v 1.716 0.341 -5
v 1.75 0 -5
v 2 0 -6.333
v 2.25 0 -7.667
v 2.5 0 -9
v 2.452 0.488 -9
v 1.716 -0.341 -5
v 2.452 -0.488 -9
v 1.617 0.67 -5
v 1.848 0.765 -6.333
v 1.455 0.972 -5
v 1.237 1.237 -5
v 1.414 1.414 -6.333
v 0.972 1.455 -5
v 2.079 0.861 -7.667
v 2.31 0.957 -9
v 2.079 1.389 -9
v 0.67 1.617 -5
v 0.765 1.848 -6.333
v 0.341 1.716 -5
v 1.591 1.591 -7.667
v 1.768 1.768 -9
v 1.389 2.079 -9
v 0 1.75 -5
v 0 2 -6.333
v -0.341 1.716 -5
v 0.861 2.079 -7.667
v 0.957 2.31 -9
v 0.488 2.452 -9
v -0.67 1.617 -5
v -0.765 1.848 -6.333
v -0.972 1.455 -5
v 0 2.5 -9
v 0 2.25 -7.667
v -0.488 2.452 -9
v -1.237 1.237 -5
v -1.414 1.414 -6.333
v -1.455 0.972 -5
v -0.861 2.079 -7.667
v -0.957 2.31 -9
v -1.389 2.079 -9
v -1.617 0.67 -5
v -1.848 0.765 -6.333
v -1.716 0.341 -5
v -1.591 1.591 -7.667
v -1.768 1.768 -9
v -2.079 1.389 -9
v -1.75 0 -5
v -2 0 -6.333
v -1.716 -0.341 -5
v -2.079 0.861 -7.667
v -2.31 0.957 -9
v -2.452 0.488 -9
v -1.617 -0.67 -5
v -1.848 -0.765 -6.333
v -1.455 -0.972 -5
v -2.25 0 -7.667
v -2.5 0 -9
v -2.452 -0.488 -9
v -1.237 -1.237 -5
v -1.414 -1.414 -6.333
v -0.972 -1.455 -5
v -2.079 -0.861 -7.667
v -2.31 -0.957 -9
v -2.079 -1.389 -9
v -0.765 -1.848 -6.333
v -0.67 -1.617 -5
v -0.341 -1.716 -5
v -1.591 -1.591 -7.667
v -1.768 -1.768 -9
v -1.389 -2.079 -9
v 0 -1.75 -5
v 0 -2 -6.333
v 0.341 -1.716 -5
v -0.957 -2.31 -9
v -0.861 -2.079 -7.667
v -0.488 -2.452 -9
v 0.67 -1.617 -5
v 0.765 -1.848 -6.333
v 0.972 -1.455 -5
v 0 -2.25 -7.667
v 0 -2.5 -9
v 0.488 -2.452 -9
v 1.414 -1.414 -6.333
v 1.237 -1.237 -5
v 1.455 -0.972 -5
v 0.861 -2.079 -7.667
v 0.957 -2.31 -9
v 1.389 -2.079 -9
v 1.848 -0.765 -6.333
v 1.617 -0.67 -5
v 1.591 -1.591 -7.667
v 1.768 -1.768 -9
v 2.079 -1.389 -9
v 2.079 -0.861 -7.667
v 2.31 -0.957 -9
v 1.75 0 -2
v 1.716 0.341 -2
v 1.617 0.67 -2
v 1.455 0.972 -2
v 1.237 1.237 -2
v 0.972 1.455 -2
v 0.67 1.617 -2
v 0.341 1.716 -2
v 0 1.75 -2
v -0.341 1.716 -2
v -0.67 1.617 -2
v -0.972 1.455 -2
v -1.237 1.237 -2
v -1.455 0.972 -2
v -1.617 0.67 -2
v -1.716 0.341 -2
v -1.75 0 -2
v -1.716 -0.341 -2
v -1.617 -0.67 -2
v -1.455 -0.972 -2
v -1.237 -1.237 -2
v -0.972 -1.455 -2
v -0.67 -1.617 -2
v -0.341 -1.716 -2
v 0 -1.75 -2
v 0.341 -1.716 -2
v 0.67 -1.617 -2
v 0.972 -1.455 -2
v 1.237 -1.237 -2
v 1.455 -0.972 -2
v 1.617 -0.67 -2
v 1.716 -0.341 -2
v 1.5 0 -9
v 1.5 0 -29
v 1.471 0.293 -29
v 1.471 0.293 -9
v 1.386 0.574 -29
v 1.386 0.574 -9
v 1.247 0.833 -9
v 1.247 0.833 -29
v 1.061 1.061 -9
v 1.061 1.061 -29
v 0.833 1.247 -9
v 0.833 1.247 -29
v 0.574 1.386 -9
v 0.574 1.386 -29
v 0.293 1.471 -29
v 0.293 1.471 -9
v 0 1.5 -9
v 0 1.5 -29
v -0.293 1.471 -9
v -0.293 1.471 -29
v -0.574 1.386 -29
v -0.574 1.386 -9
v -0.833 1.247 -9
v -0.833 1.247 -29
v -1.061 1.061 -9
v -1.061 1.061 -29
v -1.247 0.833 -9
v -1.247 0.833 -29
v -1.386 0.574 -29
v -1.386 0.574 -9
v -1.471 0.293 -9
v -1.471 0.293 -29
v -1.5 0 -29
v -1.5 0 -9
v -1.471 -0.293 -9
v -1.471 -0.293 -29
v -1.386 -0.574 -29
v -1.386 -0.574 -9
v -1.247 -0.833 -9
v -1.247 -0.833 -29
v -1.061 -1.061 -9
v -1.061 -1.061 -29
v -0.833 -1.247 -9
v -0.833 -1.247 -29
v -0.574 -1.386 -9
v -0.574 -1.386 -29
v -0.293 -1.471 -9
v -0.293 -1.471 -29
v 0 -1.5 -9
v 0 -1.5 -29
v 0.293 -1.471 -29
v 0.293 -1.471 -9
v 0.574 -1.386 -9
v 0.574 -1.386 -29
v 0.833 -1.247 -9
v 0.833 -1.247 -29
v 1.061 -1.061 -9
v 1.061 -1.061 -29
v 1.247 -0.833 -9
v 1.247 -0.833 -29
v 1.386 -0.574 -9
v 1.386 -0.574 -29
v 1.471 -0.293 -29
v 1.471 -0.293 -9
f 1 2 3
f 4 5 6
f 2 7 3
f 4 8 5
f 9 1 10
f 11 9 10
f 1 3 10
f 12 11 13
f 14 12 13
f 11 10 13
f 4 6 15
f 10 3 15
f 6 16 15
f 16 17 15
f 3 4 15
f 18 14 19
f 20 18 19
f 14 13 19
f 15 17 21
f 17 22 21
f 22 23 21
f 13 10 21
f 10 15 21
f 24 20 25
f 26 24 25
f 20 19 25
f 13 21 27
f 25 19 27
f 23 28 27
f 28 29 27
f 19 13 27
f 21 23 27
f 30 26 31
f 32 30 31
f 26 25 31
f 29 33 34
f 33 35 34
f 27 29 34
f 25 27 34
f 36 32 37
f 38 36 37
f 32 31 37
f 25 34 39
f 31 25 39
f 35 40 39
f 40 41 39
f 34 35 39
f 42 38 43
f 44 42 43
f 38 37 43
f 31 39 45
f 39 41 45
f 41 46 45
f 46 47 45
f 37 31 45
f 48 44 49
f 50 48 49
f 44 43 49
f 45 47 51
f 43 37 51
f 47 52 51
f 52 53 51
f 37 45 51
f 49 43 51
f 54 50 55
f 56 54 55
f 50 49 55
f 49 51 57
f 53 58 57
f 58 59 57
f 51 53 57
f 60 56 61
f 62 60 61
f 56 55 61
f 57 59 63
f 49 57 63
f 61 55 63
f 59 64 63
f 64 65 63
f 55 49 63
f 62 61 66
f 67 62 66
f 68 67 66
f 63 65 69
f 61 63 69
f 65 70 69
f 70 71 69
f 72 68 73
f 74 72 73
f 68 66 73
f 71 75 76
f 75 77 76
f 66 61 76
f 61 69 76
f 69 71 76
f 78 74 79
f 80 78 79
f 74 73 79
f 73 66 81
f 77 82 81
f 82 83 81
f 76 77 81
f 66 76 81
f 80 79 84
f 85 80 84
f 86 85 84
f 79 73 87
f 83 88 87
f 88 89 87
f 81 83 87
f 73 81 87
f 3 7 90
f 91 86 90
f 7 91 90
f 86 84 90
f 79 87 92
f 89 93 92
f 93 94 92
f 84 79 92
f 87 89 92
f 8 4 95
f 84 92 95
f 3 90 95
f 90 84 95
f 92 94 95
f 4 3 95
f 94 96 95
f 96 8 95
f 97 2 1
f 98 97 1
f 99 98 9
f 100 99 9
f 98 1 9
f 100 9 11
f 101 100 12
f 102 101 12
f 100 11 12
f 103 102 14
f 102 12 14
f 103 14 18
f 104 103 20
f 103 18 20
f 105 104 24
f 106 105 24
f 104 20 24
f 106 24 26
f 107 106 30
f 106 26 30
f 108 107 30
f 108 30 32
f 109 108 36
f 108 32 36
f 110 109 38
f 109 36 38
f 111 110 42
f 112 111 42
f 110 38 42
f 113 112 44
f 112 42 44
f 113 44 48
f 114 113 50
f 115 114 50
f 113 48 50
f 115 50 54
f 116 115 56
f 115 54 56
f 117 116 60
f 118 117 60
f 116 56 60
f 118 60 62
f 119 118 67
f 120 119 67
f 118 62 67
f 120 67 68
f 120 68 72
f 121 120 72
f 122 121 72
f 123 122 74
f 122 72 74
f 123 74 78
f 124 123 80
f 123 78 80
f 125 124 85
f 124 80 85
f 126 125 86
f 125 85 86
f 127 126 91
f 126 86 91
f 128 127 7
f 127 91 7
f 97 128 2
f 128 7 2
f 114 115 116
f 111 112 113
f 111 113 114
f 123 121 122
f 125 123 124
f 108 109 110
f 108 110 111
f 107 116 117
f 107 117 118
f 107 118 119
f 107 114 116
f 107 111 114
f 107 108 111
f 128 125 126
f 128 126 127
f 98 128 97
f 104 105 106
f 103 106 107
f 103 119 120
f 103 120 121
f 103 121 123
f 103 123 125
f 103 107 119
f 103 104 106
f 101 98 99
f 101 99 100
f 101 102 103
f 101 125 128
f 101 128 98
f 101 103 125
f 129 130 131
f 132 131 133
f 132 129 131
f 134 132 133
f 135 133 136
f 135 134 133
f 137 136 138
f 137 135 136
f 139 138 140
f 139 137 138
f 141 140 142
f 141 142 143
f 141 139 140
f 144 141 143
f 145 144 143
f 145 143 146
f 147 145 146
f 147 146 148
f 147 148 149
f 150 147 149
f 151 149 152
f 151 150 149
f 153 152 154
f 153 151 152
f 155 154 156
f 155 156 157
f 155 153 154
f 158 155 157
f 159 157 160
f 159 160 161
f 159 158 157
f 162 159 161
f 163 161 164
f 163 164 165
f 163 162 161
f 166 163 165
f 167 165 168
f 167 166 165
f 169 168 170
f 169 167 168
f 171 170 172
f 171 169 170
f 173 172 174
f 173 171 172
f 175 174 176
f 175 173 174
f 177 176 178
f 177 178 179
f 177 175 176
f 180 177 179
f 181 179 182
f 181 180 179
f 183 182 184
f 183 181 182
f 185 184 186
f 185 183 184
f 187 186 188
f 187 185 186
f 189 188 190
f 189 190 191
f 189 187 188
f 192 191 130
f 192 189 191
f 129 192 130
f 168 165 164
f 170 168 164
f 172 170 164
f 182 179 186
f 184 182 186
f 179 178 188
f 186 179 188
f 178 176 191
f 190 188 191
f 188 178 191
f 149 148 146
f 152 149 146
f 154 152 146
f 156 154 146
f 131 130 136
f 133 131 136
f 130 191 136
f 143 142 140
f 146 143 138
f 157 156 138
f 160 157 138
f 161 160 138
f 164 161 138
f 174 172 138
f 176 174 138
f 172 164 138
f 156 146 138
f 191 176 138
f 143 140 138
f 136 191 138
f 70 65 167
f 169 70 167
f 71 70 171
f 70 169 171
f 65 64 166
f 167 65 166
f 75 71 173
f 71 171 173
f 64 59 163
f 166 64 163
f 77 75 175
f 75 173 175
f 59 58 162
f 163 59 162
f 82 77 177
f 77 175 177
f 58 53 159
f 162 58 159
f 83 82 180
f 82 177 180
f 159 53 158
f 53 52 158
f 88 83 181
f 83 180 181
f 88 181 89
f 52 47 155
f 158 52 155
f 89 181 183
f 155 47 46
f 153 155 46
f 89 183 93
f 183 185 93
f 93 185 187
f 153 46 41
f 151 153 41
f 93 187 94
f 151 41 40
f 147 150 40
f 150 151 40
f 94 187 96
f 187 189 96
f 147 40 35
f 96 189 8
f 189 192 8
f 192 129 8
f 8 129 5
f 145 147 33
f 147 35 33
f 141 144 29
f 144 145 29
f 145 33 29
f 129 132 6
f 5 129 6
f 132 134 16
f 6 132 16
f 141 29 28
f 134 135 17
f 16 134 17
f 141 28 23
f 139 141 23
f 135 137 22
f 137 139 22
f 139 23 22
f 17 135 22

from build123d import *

# Parameters (mm, degrees)
SKETCH015_R  = 1.75
SKETCH016_R  = 2.5
SKETCH017_R  = 1.5
PAD007_DEPTH = 20
SKETCH014_R  = 1.75
PAD008_DEPTH = 3


with BuildPart() as part:
    # Sketch015 → AdditiveLoft001 section 0
    with BuildSketch(Plane.XY.offset(-5)):
        Circle(SKETCH015_R)
    # Sketch016 → AdditiveLoft001 section 1
    with BuildSketch(Plane.XY.offset(-9)):
        Circle(SKETCH016_R)
    loft()

    # Sketch017 → Pad007 (new body)
    with BuildSketch(Plane.XY.offset(-9)):
        Circle(SKETCH017_R)
    extrude(amount=-PAD007_DEPTH)

    # Sketch014 → Pad008 (join)
    with BuildSketch(Plane.XY.offset(-5)):
        Circle(SKETCH014_R)
    extrude(amount=PAD008_DEPTH)


solid = part.part
